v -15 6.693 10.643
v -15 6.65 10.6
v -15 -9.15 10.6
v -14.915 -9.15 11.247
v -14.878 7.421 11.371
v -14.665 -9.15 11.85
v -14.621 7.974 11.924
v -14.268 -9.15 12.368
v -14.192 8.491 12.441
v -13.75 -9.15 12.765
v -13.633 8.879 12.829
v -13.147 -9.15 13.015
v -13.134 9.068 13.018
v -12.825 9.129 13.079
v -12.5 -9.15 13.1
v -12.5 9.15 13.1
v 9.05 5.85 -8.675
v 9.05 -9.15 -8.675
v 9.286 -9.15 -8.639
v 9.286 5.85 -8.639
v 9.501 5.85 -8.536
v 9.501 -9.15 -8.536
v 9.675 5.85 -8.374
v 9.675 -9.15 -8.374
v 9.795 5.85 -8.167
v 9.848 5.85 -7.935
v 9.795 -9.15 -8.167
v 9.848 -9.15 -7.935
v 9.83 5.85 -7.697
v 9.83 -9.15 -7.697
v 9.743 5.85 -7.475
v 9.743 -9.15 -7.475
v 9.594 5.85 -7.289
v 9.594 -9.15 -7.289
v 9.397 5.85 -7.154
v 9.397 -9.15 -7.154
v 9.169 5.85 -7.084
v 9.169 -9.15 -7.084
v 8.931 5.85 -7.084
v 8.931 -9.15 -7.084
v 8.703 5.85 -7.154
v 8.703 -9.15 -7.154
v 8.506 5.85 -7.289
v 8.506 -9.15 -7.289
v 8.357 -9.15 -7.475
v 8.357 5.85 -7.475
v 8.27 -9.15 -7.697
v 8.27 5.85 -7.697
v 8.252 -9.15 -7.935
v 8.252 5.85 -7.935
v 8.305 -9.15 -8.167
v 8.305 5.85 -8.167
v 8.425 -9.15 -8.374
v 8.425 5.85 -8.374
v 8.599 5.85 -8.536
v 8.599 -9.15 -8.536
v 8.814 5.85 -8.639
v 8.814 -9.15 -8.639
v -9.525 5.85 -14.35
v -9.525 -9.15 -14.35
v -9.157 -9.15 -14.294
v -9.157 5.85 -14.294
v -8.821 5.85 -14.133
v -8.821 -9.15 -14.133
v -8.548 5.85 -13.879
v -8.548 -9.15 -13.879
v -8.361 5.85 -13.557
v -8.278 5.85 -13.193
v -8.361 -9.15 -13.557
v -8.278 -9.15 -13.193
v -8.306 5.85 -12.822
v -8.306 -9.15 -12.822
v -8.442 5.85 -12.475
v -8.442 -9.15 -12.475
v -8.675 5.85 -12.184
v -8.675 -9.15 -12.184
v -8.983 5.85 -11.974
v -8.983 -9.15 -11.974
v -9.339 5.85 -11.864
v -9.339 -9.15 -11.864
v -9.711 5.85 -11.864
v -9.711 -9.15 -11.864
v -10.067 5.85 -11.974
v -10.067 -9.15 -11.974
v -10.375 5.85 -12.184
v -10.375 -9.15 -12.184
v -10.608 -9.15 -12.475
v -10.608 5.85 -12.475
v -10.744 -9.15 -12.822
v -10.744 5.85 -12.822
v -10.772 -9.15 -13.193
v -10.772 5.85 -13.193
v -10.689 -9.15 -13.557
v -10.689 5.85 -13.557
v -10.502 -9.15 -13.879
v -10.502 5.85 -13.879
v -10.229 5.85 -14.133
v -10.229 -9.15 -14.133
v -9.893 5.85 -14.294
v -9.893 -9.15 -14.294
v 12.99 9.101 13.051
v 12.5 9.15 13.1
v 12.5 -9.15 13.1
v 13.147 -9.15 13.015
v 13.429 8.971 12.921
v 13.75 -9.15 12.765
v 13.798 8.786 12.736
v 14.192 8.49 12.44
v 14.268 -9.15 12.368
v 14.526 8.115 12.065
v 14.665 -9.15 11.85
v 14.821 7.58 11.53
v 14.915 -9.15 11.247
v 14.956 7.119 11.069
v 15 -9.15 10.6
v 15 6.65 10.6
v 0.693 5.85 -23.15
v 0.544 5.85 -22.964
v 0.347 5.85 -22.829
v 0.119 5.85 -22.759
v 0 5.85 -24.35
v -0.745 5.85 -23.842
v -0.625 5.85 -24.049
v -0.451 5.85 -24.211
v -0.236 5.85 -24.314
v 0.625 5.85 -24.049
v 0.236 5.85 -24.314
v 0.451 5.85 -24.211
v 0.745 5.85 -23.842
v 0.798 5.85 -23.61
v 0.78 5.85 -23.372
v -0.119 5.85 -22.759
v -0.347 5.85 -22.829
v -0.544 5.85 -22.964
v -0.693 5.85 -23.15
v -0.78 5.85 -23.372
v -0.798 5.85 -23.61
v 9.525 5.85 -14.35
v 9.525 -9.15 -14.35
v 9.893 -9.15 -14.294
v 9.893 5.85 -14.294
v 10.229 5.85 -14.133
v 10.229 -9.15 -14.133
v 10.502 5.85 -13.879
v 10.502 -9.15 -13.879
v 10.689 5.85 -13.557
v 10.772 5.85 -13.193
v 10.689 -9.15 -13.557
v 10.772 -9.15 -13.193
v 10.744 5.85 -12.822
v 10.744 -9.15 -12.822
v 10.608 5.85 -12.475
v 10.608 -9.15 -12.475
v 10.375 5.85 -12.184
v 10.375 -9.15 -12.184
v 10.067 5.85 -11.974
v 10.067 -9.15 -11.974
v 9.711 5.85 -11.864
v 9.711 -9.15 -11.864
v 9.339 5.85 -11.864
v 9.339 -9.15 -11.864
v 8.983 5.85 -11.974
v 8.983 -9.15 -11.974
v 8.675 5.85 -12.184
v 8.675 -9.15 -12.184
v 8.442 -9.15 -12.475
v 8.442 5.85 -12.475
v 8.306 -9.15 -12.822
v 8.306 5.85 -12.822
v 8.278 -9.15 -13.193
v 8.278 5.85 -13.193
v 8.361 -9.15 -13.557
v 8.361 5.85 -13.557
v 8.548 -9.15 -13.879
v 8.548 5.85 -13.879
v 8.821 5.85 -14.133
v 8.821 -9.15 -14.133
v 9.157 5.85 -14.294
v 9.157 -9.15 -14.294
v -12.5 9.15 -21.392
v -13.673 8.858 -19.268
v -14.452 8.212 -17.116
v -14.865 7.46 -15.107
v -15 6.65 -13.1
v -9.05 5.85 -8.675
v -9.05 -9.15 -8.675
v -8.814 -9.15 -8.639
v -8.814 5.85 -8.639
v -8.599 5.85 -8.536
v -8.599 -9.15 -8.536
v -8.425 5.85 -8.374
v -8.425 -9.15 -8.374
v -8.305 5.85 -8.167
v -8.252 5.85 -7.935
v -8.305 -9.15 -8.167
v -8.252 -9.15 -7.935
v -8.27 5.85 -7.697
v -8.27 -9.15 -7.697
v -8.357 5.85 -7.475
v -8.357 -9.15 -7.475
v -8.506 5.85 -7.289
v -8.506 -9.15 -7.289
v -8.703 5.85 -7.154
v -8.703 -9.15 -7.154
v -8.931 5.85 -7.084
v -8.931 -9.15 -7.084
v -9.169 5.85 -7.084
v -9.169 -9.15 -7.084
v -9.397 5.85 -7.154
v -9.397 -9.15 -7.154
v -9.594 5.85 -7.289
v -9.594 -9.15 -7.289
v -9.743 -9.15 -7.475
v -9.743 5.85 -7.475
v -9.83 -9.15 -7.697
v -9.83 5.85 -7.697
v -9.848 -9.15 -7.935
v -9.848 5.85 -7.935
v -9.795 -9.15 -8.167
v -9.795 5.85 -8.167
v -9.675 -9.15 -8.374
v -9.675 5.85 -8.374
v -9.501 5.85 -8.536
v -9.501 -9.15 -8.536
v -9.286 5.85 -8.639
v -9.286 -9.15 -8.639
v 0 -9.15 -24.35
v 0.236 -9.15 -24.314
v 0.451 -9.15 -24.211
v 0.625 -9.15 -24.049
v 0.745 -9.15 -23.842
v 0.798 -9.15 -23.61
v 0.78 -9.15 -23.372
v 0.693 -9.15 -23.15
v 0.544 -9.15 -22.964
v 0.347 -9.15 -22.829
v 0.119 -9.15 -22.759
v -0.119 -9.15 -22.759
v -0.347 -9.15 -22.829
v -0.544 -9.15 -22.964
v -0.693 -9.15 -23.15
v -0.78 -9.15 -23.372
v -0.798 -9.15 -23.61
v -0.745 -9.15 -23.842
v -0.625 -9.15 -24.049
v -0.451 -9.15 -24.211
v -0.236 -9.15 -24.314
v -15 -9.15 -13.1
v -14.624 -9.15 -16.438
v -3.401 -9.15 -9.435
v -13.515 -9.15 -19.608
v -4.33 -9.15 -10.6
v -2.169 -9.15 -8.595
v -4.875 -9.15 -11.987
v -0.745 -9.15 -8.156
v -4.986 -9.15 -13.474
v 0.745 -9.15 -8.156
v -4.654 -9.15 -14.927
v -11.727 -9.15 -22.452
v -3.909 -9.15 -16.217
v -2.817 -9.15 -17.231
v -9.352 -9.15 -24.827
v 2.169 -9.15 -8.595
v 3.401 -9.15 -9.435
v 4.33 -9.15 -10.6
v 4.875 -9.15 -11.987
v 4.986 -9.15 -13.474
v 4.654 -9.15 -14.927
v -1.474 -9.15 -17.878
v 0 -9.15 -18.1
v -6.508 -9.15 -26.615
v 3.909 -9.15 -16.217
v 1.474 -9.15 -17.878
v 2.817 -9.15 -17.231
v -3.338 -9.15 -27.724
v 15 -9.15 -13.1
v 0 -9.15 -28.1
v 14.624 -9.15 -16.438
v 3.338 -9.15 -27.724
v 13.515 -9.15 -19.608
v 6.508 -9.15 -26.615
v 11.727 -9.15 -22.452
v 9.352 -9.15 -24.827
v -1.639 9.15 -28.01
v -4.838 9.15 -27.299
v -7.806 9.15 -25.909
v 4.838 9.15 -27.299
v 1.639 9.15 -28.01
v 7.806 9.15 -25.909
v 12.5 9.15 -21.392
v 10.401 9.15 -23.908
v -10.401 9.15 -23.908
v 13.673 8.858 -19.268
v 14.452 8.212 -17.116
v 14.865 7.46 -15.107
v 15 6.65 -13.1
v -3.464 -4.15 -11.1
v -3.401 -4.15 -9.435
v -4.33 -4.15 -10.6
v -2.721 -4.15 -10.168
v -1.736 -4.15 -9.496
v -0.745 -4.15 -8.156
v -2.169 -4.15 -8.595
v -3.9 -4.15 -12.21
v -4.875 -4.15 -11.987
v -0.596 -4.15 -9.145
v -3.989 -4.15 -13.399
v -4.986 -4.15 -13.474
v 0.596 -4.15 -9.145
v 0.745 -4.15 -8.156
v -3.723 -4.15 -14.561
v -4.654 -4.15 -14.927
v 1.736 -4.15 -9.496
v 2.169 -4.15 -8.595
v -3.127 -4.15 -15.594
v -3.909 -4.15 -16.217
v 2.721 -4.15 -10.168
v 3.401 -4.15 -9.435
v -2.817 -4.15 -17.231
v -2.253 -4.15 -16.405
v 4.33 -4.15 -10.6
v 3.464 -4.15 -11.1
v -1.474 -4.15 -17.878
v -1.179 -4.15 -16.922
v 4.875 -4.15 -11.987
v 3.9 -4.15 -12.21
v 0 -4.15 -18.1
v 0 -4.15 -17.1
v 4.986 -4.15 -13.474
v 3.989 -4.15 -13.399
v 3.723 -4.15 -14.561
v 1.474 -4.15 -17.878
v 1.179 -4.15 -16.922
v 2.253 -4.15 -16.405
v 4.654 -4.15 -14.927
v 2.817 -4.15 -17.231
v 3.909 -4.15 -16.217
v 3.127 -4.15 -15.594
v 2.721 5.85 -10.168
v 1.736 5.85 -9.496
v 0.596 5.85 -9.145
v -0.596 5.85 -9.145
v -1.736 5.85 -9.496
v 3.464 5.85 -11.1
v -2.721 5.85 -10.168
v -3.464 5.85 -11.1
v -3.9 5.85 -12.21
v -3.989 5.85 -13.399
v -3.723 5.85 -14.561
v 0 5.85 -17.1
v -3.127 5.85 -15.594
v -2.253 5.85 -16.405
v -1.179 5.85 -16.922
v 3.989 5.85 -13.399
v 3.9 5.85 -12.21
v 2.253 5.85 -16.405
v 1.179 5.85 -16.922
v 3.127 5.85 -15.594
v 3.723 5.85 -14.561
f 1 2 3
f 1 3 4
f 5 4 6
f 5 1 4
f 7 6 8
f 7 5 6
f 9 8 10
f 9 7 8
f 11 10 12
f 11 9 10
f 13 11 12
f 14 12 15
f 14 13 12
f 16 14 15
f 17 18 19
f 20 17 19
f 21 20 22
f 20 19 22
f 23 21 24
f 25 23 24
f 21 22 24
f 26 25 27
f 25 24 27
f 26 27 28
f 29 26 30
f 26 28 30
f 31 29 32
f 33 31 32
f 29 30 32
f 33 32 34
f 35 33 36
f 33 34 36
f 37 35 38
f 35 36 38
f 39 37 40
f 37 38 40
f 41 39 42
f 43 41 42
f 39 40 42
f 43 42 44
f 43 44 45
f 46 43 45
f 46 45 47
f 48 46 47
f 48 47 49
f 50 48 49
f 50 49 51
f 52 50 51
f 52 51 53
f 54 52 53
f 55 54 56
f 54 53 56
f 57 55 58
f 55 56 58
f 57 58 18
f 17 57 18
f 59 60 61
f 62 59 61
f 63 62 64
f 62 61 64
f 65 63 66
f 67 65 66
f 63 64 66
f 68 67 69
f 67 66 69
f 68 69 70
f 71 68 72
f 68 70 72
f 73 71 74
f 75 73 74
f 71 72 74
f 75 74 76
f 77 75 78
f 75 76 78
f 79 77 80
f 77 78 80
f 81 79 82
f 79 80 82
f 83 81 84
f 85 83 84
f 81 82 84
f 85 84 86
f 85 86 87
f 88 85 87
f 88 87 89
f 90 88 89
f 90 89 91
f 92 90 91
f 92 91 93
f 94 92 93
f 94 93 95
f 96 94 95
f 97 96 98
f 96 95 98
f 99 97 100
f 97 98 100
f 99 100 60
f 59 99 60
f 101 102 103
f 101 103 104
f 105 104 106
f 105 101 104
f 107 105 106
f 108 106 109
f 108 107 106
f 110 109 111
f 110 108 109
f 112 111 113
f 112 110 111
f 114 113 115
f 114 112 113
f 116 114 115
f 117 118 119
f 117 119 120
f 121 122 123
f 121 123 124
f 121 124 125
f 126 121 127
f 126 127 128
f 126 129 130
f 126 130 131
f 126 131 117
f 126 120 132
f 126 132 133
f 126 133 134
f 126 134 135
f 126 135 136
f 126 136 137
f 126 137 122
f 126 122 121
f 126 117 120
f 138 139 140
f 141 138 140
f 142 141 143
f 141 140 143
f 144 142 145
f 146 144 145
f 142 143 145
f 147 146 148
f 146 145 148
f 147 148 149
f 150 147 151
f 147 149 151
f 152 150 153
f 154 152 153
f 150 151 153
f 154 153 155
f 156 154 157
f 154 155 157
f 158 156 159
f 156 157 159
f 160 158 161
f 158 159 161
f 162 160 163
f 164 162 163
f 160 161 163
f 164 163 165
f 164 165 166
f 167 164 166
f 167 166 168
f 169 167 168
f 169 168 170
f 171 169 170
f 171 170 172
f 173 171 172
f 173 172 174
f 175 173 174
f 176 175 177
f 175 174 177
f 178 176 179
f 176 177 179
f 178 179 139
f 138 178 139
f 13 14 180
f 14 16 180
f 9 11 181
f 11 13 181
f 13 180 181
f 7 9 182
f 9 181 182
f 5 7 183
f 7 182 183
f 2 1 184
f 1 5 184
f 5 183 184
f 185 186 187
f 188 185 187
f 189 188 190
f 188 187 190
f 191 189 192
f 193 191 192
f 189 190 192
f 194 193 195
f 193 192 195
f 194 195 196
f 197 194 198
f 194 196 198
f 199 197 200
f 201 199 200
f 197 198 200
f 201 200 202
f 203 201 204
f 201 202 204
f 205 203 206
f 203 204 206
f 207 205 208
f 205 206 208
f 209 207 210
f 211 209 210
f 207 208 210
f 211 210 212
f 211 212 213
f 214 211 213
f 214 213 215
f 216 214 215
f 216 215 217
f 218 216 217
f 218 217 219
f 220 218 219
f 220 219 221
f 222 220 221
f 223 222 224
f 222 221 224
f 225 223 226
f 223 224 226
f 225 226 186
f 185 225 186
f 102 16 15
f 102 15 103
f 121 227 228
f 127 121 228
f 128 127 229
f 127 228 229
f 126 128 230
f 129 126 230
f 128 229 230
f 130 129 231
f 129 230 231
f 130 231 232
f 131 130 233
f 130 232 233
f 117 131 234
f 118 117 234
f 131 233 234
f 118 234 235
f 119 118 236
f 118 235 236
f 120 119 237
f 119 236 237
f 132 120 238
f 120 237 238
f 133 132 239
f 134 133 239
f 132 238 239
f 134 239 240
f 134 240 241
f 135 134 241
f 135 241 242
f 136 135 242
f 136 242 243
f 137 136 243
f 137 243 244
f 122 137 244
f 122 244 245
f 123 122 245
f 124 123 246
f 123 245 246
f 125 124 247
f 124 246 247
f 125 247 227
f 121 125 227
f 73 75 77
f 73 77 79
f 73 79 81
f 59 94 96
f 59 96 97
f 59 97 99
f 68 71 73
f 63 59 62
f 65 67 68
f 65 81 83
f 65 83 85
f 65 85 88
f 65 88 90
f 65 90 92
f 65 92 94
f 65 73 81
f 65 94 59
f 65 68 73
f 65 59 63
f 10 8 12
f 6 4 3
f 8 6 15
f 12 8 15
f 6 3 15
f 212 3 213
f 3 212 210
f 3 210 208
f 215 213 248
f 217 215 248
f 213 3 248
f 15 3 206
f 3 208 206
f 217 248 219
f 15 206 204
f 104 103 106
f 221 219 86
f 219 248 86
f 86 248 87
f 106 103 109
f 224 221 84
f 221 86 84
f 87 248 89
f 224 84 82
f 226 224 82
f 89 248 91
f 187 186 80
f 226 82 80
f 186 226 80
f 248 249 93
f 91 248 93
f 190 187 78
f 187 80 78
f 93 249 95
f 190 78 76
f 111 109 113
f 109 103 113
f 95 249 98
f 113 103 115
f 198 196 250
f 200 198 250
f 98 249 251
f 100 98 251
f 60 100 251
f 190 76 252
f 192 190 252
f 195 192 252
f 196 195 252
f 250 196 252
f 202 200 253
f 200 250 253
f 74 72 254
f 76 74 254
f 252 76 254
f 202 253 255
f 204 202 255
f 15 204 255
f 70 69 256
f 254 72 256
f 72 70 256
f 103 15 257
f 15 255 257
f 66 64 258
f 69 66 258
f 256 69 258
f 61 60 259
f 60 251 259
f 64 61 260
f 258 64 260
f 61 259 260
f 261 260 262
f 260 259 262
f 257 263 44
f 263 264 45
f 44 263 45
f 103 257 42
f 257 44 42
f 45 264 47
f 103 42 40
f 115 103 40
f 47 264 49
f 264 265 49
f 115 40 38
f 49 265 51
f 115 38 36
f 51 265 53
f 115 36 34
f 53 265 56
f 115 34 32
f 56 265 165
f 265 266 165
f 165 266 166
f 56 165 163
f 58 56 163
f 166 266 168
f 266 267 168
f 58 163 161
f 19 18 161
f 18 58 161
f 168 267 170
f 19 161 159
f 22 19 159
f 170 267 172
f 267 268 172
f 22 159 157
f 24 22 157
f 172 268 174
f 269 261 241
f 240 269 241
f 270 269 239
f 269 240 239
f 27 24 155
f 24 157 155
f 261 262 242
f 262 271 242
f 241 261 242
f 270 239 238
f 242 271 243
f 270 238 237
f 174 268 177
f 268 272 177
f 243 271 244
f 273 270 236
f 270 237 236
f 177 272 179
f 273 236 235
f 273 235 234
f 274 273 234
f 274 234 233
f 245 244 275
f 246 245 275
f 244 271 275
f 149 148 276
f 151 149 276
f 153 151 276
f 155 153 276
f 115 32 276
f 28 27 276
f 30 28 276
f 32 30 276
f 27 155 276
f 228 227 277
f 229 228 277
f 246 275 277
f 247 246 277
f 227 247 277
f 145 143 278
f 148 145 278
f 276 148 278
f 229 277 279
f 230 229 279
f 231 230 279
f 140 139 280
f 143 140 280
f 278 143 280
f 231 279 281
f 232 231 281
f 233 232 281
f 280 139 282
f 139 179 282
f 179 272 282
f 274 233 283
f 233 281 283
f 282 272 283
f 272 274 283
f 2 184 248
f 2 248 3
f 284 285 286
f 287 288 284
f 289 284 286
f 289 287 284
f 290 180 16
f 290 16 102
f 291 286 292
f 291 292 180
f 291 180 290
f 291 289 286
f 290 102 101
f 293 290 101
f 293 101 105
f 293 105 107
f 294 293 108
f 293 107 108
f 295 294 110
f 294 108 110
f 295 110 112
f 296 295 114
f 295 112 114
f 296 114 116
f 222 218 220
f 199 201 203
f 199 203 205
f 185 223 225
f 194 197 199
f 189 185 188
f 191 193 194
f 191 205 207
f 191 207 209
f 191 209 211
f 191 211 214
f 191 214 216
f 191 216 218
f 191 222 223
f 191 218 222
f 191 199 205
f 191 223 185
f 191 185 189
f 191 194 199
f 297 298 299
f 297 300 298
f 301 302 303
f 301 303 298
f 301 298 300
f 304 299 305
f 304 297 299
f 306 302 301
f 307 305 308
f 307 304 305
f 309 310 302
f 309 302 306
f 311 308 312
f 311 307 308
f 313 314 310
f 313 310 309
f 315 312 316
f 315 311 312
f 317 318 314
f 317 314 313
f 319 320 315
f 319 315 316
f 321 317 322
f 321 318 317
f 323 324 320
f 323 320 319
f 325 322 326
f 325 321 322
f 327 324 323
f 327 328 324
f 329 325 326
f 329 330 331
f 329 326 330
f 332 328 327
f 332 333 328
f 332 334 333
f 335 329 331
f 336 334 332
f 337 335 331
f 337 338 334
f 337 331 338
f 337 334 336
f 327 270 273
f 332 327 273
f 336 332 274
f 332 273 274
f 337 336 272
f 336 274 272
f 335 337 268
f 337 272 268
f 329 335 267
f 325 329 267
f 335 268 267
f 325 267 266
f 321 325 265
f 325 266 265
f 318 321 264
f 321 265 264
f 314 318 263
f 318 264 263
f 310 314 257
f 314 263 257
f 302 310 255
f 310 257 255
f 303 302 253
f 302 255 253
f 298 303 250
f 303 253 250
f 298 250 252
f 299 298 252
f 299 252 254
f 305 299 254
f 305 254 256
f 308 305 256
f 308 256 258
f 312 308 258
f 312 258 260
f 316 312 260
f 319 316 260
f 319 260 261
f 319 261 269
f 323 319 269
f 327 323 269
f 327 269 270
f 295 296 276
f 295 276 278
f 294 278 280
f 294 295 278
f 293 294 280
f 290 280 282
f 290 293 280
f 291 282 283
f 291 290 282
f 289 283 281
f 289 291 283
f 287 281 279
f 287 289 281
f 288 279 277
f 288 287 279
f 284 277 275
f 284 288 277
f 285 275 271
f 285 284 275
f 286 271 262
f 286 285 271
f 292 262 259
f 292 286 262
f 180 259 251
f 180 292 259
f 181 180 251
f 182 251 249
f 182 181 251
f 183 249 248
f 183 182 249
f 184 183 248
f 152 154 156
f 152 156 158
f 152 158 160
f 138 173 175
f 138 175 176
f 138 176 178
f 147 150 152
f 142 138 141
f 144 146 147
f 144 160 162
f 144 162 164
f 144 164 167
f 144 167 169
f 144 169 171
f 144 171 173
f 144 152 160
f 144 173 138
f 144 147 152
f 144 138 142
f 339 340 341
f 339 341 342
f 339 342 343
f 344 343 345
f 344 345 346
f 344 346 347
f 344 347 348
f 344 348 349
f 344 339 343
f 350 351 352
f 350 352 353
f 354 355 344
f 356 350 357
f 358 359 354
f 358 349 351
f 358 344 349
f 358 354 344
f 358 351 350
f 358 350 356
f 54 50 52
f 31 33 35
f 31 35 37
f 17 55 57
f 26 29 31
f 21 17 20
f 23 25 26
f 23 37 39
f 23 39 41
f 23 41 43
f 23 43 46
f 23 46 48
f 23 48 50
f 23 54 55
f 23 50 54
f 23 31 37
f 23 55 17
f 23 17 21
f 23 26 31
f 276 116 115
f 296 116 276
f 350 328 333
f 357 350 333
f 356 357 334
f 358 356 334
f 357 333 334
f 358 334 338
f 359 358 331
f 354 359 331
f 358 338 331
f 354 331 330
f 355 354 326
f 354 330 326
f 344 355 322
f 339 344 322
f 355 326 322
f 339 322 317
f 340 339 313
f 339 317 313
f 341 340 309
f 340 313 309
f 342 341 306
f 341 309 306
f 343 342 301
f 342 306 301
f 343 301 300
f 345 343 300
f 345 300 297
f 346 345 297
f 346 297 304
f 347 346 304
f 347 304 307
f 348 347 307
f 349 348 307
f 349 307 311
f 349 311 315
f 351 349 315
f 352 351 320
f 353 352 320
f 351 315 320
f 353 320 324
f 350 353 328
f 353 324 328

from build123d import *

# Parameters (mm, degrees)
BOSS_EXTRUDE1_DEPTH = 9.15
FILLET1_R           = 2.5
SKETCH5_R           = 0.8
CUT_EXTRUDE1_DEPTH  = 15
SKETCH8_R           = 1.25
CUT_EXTRUDE2_DEPTH  = 15
SKETCH9_R           = 5
CUT_EXTRUDE3_DEPTH  = 15
BOSS_EXTRUDE2_START = 10
SKETCH10_R          = 5
SKETCH10_R_2        = 4
BOSS_EXTRUDE2_DEPTH = 10


with BuildPart() as part:
    # Sketch1 → Boss-Extrude1 (new, symmetric)
    with BuildSketch(Plane(origin=(0, 0, 0), x_dir=(1, 0, 0), z_dir=(0, 1, 0))):
        with BuildLine():
            Line((-15, 13.1), (-15, -10.6))
            ThreePointArc((-15, -10.6), (-14.267766953, -12.367766953), (-12.5, -13.1))
            Line((-12.5, -13.1), (12.5, -13.1))
            ThreePointArc((12.5, -13.1), (14.267766953, -12.367766953), (15, -10.6))
            Line((15, -10.6), (15, 13.1))
            ThreePointArc((15, 13.1), (0, 28.1), (-15, 13.1))
        make_face()
    extrude(amount=BOSS_EXTRUDE1_DEPTH, both=True)

    # Fillet1
    # the kernel refuses this fillet: 2.5 mm, written as the material it takes off along each edge
    with BuildSketch(Plane(origin=(-15, 9.15, -28.1), x_dir=(0, -1, 0), z_dir=(0, 0, 1)), Plane(origin=(15, 9.15, 25.6), x_dir=(0, -1, 0), z_dir=(0, 0, -1))) as fillet1_piece_1:
        with BuildLine():
            CenterArc((FILLET1_R, FILLET1_R), FILLET1_R, 180, 90)
            Line((0, FILLET1_R), (-FILLET1_R * 0.02, FILLET1_R))
            Line((-FILLET1_R * 0.02, FILLET1_R), (-FILLET1_R * 0.02, -FILLET1_R * 0.02))
            Line((-FILLET1_R * 0.02, -FILLET1_R * 0.02), (FILLET1_R, -FILLET1_R * 0.02))
            Line((FILLET1_R, -FILLET1_R * 0.02), (FILLET1_R, 0))
        make_face()
    extrude(amount=53.7, mode=Mode.SUBTRACT)

    # Sketch5 → Cut-Extrude1 (cut)
    with BuildSketch(Plane.XZ.offset(9.15)):
        with Locations(Location((0, -23.55, 0), (0, 0, 270))):
            Circle(SKETCH5_R)
        with Locations(Location((-9.04996547, -7.875, 0), (0, 0, 270))):
            Circle(SKETCH5_R)
        with Locations(Location((9.04996547, -7.875, 0), (0, 0, 270))):
            Circle(SKETCH5_R)
    extrude(amount=-CUT_EXTRUDE1_DEPTH, mode=Mode.SUBTRACT)

    # Sketch8 → Cut-Extrude2 (cut)
    with BuildSketch(Plane.XZ.offset(9.15)):
        with Locations(Location((-9.525, -13.1, 0), (0, 0, 270))):
            Circle(SKETCH8_R)
        with Locations(Location((9.525, -13.1, 0), (0, 0, 270))):
            Circle(SKETCH8_R)
    extrude(amount=-CUT_EXTRUDE2_DEPTH, mode=Mode.SUBTRACT)

    # Sketch9 → Cut-Extrude3 (cut)
    with BuildSketch(Plane.XZ.offset(9.15)):
        with Locations(Location((0, -13.1, 0), (0, 0, 270))):
            Circle(SKETCH9_R)
    extrude(amount=-CUT_EXTRUDE3_DEPTH, mode=Mode.SUBTRACT)

    # Sketch10 → Boss-Extrude2 (add)
    with BuildSketch(Plane.XZ.offset(-5.85).offset(BOSS_EXTRUDE2_START)):
        with Locations(Location((0, -13.1, 0), (0, 0, 270))):
            Circle(SKETCH10_R)
        with Locations(Location((0, -13.1, 0), (0, 0, 270))):
            Circle(SKETCH10_R_2, mode=Mode.SUBTRACT)
    extrude(amount=-BOSS_EXTRUDE2_DEPTH)


solid = part.part
